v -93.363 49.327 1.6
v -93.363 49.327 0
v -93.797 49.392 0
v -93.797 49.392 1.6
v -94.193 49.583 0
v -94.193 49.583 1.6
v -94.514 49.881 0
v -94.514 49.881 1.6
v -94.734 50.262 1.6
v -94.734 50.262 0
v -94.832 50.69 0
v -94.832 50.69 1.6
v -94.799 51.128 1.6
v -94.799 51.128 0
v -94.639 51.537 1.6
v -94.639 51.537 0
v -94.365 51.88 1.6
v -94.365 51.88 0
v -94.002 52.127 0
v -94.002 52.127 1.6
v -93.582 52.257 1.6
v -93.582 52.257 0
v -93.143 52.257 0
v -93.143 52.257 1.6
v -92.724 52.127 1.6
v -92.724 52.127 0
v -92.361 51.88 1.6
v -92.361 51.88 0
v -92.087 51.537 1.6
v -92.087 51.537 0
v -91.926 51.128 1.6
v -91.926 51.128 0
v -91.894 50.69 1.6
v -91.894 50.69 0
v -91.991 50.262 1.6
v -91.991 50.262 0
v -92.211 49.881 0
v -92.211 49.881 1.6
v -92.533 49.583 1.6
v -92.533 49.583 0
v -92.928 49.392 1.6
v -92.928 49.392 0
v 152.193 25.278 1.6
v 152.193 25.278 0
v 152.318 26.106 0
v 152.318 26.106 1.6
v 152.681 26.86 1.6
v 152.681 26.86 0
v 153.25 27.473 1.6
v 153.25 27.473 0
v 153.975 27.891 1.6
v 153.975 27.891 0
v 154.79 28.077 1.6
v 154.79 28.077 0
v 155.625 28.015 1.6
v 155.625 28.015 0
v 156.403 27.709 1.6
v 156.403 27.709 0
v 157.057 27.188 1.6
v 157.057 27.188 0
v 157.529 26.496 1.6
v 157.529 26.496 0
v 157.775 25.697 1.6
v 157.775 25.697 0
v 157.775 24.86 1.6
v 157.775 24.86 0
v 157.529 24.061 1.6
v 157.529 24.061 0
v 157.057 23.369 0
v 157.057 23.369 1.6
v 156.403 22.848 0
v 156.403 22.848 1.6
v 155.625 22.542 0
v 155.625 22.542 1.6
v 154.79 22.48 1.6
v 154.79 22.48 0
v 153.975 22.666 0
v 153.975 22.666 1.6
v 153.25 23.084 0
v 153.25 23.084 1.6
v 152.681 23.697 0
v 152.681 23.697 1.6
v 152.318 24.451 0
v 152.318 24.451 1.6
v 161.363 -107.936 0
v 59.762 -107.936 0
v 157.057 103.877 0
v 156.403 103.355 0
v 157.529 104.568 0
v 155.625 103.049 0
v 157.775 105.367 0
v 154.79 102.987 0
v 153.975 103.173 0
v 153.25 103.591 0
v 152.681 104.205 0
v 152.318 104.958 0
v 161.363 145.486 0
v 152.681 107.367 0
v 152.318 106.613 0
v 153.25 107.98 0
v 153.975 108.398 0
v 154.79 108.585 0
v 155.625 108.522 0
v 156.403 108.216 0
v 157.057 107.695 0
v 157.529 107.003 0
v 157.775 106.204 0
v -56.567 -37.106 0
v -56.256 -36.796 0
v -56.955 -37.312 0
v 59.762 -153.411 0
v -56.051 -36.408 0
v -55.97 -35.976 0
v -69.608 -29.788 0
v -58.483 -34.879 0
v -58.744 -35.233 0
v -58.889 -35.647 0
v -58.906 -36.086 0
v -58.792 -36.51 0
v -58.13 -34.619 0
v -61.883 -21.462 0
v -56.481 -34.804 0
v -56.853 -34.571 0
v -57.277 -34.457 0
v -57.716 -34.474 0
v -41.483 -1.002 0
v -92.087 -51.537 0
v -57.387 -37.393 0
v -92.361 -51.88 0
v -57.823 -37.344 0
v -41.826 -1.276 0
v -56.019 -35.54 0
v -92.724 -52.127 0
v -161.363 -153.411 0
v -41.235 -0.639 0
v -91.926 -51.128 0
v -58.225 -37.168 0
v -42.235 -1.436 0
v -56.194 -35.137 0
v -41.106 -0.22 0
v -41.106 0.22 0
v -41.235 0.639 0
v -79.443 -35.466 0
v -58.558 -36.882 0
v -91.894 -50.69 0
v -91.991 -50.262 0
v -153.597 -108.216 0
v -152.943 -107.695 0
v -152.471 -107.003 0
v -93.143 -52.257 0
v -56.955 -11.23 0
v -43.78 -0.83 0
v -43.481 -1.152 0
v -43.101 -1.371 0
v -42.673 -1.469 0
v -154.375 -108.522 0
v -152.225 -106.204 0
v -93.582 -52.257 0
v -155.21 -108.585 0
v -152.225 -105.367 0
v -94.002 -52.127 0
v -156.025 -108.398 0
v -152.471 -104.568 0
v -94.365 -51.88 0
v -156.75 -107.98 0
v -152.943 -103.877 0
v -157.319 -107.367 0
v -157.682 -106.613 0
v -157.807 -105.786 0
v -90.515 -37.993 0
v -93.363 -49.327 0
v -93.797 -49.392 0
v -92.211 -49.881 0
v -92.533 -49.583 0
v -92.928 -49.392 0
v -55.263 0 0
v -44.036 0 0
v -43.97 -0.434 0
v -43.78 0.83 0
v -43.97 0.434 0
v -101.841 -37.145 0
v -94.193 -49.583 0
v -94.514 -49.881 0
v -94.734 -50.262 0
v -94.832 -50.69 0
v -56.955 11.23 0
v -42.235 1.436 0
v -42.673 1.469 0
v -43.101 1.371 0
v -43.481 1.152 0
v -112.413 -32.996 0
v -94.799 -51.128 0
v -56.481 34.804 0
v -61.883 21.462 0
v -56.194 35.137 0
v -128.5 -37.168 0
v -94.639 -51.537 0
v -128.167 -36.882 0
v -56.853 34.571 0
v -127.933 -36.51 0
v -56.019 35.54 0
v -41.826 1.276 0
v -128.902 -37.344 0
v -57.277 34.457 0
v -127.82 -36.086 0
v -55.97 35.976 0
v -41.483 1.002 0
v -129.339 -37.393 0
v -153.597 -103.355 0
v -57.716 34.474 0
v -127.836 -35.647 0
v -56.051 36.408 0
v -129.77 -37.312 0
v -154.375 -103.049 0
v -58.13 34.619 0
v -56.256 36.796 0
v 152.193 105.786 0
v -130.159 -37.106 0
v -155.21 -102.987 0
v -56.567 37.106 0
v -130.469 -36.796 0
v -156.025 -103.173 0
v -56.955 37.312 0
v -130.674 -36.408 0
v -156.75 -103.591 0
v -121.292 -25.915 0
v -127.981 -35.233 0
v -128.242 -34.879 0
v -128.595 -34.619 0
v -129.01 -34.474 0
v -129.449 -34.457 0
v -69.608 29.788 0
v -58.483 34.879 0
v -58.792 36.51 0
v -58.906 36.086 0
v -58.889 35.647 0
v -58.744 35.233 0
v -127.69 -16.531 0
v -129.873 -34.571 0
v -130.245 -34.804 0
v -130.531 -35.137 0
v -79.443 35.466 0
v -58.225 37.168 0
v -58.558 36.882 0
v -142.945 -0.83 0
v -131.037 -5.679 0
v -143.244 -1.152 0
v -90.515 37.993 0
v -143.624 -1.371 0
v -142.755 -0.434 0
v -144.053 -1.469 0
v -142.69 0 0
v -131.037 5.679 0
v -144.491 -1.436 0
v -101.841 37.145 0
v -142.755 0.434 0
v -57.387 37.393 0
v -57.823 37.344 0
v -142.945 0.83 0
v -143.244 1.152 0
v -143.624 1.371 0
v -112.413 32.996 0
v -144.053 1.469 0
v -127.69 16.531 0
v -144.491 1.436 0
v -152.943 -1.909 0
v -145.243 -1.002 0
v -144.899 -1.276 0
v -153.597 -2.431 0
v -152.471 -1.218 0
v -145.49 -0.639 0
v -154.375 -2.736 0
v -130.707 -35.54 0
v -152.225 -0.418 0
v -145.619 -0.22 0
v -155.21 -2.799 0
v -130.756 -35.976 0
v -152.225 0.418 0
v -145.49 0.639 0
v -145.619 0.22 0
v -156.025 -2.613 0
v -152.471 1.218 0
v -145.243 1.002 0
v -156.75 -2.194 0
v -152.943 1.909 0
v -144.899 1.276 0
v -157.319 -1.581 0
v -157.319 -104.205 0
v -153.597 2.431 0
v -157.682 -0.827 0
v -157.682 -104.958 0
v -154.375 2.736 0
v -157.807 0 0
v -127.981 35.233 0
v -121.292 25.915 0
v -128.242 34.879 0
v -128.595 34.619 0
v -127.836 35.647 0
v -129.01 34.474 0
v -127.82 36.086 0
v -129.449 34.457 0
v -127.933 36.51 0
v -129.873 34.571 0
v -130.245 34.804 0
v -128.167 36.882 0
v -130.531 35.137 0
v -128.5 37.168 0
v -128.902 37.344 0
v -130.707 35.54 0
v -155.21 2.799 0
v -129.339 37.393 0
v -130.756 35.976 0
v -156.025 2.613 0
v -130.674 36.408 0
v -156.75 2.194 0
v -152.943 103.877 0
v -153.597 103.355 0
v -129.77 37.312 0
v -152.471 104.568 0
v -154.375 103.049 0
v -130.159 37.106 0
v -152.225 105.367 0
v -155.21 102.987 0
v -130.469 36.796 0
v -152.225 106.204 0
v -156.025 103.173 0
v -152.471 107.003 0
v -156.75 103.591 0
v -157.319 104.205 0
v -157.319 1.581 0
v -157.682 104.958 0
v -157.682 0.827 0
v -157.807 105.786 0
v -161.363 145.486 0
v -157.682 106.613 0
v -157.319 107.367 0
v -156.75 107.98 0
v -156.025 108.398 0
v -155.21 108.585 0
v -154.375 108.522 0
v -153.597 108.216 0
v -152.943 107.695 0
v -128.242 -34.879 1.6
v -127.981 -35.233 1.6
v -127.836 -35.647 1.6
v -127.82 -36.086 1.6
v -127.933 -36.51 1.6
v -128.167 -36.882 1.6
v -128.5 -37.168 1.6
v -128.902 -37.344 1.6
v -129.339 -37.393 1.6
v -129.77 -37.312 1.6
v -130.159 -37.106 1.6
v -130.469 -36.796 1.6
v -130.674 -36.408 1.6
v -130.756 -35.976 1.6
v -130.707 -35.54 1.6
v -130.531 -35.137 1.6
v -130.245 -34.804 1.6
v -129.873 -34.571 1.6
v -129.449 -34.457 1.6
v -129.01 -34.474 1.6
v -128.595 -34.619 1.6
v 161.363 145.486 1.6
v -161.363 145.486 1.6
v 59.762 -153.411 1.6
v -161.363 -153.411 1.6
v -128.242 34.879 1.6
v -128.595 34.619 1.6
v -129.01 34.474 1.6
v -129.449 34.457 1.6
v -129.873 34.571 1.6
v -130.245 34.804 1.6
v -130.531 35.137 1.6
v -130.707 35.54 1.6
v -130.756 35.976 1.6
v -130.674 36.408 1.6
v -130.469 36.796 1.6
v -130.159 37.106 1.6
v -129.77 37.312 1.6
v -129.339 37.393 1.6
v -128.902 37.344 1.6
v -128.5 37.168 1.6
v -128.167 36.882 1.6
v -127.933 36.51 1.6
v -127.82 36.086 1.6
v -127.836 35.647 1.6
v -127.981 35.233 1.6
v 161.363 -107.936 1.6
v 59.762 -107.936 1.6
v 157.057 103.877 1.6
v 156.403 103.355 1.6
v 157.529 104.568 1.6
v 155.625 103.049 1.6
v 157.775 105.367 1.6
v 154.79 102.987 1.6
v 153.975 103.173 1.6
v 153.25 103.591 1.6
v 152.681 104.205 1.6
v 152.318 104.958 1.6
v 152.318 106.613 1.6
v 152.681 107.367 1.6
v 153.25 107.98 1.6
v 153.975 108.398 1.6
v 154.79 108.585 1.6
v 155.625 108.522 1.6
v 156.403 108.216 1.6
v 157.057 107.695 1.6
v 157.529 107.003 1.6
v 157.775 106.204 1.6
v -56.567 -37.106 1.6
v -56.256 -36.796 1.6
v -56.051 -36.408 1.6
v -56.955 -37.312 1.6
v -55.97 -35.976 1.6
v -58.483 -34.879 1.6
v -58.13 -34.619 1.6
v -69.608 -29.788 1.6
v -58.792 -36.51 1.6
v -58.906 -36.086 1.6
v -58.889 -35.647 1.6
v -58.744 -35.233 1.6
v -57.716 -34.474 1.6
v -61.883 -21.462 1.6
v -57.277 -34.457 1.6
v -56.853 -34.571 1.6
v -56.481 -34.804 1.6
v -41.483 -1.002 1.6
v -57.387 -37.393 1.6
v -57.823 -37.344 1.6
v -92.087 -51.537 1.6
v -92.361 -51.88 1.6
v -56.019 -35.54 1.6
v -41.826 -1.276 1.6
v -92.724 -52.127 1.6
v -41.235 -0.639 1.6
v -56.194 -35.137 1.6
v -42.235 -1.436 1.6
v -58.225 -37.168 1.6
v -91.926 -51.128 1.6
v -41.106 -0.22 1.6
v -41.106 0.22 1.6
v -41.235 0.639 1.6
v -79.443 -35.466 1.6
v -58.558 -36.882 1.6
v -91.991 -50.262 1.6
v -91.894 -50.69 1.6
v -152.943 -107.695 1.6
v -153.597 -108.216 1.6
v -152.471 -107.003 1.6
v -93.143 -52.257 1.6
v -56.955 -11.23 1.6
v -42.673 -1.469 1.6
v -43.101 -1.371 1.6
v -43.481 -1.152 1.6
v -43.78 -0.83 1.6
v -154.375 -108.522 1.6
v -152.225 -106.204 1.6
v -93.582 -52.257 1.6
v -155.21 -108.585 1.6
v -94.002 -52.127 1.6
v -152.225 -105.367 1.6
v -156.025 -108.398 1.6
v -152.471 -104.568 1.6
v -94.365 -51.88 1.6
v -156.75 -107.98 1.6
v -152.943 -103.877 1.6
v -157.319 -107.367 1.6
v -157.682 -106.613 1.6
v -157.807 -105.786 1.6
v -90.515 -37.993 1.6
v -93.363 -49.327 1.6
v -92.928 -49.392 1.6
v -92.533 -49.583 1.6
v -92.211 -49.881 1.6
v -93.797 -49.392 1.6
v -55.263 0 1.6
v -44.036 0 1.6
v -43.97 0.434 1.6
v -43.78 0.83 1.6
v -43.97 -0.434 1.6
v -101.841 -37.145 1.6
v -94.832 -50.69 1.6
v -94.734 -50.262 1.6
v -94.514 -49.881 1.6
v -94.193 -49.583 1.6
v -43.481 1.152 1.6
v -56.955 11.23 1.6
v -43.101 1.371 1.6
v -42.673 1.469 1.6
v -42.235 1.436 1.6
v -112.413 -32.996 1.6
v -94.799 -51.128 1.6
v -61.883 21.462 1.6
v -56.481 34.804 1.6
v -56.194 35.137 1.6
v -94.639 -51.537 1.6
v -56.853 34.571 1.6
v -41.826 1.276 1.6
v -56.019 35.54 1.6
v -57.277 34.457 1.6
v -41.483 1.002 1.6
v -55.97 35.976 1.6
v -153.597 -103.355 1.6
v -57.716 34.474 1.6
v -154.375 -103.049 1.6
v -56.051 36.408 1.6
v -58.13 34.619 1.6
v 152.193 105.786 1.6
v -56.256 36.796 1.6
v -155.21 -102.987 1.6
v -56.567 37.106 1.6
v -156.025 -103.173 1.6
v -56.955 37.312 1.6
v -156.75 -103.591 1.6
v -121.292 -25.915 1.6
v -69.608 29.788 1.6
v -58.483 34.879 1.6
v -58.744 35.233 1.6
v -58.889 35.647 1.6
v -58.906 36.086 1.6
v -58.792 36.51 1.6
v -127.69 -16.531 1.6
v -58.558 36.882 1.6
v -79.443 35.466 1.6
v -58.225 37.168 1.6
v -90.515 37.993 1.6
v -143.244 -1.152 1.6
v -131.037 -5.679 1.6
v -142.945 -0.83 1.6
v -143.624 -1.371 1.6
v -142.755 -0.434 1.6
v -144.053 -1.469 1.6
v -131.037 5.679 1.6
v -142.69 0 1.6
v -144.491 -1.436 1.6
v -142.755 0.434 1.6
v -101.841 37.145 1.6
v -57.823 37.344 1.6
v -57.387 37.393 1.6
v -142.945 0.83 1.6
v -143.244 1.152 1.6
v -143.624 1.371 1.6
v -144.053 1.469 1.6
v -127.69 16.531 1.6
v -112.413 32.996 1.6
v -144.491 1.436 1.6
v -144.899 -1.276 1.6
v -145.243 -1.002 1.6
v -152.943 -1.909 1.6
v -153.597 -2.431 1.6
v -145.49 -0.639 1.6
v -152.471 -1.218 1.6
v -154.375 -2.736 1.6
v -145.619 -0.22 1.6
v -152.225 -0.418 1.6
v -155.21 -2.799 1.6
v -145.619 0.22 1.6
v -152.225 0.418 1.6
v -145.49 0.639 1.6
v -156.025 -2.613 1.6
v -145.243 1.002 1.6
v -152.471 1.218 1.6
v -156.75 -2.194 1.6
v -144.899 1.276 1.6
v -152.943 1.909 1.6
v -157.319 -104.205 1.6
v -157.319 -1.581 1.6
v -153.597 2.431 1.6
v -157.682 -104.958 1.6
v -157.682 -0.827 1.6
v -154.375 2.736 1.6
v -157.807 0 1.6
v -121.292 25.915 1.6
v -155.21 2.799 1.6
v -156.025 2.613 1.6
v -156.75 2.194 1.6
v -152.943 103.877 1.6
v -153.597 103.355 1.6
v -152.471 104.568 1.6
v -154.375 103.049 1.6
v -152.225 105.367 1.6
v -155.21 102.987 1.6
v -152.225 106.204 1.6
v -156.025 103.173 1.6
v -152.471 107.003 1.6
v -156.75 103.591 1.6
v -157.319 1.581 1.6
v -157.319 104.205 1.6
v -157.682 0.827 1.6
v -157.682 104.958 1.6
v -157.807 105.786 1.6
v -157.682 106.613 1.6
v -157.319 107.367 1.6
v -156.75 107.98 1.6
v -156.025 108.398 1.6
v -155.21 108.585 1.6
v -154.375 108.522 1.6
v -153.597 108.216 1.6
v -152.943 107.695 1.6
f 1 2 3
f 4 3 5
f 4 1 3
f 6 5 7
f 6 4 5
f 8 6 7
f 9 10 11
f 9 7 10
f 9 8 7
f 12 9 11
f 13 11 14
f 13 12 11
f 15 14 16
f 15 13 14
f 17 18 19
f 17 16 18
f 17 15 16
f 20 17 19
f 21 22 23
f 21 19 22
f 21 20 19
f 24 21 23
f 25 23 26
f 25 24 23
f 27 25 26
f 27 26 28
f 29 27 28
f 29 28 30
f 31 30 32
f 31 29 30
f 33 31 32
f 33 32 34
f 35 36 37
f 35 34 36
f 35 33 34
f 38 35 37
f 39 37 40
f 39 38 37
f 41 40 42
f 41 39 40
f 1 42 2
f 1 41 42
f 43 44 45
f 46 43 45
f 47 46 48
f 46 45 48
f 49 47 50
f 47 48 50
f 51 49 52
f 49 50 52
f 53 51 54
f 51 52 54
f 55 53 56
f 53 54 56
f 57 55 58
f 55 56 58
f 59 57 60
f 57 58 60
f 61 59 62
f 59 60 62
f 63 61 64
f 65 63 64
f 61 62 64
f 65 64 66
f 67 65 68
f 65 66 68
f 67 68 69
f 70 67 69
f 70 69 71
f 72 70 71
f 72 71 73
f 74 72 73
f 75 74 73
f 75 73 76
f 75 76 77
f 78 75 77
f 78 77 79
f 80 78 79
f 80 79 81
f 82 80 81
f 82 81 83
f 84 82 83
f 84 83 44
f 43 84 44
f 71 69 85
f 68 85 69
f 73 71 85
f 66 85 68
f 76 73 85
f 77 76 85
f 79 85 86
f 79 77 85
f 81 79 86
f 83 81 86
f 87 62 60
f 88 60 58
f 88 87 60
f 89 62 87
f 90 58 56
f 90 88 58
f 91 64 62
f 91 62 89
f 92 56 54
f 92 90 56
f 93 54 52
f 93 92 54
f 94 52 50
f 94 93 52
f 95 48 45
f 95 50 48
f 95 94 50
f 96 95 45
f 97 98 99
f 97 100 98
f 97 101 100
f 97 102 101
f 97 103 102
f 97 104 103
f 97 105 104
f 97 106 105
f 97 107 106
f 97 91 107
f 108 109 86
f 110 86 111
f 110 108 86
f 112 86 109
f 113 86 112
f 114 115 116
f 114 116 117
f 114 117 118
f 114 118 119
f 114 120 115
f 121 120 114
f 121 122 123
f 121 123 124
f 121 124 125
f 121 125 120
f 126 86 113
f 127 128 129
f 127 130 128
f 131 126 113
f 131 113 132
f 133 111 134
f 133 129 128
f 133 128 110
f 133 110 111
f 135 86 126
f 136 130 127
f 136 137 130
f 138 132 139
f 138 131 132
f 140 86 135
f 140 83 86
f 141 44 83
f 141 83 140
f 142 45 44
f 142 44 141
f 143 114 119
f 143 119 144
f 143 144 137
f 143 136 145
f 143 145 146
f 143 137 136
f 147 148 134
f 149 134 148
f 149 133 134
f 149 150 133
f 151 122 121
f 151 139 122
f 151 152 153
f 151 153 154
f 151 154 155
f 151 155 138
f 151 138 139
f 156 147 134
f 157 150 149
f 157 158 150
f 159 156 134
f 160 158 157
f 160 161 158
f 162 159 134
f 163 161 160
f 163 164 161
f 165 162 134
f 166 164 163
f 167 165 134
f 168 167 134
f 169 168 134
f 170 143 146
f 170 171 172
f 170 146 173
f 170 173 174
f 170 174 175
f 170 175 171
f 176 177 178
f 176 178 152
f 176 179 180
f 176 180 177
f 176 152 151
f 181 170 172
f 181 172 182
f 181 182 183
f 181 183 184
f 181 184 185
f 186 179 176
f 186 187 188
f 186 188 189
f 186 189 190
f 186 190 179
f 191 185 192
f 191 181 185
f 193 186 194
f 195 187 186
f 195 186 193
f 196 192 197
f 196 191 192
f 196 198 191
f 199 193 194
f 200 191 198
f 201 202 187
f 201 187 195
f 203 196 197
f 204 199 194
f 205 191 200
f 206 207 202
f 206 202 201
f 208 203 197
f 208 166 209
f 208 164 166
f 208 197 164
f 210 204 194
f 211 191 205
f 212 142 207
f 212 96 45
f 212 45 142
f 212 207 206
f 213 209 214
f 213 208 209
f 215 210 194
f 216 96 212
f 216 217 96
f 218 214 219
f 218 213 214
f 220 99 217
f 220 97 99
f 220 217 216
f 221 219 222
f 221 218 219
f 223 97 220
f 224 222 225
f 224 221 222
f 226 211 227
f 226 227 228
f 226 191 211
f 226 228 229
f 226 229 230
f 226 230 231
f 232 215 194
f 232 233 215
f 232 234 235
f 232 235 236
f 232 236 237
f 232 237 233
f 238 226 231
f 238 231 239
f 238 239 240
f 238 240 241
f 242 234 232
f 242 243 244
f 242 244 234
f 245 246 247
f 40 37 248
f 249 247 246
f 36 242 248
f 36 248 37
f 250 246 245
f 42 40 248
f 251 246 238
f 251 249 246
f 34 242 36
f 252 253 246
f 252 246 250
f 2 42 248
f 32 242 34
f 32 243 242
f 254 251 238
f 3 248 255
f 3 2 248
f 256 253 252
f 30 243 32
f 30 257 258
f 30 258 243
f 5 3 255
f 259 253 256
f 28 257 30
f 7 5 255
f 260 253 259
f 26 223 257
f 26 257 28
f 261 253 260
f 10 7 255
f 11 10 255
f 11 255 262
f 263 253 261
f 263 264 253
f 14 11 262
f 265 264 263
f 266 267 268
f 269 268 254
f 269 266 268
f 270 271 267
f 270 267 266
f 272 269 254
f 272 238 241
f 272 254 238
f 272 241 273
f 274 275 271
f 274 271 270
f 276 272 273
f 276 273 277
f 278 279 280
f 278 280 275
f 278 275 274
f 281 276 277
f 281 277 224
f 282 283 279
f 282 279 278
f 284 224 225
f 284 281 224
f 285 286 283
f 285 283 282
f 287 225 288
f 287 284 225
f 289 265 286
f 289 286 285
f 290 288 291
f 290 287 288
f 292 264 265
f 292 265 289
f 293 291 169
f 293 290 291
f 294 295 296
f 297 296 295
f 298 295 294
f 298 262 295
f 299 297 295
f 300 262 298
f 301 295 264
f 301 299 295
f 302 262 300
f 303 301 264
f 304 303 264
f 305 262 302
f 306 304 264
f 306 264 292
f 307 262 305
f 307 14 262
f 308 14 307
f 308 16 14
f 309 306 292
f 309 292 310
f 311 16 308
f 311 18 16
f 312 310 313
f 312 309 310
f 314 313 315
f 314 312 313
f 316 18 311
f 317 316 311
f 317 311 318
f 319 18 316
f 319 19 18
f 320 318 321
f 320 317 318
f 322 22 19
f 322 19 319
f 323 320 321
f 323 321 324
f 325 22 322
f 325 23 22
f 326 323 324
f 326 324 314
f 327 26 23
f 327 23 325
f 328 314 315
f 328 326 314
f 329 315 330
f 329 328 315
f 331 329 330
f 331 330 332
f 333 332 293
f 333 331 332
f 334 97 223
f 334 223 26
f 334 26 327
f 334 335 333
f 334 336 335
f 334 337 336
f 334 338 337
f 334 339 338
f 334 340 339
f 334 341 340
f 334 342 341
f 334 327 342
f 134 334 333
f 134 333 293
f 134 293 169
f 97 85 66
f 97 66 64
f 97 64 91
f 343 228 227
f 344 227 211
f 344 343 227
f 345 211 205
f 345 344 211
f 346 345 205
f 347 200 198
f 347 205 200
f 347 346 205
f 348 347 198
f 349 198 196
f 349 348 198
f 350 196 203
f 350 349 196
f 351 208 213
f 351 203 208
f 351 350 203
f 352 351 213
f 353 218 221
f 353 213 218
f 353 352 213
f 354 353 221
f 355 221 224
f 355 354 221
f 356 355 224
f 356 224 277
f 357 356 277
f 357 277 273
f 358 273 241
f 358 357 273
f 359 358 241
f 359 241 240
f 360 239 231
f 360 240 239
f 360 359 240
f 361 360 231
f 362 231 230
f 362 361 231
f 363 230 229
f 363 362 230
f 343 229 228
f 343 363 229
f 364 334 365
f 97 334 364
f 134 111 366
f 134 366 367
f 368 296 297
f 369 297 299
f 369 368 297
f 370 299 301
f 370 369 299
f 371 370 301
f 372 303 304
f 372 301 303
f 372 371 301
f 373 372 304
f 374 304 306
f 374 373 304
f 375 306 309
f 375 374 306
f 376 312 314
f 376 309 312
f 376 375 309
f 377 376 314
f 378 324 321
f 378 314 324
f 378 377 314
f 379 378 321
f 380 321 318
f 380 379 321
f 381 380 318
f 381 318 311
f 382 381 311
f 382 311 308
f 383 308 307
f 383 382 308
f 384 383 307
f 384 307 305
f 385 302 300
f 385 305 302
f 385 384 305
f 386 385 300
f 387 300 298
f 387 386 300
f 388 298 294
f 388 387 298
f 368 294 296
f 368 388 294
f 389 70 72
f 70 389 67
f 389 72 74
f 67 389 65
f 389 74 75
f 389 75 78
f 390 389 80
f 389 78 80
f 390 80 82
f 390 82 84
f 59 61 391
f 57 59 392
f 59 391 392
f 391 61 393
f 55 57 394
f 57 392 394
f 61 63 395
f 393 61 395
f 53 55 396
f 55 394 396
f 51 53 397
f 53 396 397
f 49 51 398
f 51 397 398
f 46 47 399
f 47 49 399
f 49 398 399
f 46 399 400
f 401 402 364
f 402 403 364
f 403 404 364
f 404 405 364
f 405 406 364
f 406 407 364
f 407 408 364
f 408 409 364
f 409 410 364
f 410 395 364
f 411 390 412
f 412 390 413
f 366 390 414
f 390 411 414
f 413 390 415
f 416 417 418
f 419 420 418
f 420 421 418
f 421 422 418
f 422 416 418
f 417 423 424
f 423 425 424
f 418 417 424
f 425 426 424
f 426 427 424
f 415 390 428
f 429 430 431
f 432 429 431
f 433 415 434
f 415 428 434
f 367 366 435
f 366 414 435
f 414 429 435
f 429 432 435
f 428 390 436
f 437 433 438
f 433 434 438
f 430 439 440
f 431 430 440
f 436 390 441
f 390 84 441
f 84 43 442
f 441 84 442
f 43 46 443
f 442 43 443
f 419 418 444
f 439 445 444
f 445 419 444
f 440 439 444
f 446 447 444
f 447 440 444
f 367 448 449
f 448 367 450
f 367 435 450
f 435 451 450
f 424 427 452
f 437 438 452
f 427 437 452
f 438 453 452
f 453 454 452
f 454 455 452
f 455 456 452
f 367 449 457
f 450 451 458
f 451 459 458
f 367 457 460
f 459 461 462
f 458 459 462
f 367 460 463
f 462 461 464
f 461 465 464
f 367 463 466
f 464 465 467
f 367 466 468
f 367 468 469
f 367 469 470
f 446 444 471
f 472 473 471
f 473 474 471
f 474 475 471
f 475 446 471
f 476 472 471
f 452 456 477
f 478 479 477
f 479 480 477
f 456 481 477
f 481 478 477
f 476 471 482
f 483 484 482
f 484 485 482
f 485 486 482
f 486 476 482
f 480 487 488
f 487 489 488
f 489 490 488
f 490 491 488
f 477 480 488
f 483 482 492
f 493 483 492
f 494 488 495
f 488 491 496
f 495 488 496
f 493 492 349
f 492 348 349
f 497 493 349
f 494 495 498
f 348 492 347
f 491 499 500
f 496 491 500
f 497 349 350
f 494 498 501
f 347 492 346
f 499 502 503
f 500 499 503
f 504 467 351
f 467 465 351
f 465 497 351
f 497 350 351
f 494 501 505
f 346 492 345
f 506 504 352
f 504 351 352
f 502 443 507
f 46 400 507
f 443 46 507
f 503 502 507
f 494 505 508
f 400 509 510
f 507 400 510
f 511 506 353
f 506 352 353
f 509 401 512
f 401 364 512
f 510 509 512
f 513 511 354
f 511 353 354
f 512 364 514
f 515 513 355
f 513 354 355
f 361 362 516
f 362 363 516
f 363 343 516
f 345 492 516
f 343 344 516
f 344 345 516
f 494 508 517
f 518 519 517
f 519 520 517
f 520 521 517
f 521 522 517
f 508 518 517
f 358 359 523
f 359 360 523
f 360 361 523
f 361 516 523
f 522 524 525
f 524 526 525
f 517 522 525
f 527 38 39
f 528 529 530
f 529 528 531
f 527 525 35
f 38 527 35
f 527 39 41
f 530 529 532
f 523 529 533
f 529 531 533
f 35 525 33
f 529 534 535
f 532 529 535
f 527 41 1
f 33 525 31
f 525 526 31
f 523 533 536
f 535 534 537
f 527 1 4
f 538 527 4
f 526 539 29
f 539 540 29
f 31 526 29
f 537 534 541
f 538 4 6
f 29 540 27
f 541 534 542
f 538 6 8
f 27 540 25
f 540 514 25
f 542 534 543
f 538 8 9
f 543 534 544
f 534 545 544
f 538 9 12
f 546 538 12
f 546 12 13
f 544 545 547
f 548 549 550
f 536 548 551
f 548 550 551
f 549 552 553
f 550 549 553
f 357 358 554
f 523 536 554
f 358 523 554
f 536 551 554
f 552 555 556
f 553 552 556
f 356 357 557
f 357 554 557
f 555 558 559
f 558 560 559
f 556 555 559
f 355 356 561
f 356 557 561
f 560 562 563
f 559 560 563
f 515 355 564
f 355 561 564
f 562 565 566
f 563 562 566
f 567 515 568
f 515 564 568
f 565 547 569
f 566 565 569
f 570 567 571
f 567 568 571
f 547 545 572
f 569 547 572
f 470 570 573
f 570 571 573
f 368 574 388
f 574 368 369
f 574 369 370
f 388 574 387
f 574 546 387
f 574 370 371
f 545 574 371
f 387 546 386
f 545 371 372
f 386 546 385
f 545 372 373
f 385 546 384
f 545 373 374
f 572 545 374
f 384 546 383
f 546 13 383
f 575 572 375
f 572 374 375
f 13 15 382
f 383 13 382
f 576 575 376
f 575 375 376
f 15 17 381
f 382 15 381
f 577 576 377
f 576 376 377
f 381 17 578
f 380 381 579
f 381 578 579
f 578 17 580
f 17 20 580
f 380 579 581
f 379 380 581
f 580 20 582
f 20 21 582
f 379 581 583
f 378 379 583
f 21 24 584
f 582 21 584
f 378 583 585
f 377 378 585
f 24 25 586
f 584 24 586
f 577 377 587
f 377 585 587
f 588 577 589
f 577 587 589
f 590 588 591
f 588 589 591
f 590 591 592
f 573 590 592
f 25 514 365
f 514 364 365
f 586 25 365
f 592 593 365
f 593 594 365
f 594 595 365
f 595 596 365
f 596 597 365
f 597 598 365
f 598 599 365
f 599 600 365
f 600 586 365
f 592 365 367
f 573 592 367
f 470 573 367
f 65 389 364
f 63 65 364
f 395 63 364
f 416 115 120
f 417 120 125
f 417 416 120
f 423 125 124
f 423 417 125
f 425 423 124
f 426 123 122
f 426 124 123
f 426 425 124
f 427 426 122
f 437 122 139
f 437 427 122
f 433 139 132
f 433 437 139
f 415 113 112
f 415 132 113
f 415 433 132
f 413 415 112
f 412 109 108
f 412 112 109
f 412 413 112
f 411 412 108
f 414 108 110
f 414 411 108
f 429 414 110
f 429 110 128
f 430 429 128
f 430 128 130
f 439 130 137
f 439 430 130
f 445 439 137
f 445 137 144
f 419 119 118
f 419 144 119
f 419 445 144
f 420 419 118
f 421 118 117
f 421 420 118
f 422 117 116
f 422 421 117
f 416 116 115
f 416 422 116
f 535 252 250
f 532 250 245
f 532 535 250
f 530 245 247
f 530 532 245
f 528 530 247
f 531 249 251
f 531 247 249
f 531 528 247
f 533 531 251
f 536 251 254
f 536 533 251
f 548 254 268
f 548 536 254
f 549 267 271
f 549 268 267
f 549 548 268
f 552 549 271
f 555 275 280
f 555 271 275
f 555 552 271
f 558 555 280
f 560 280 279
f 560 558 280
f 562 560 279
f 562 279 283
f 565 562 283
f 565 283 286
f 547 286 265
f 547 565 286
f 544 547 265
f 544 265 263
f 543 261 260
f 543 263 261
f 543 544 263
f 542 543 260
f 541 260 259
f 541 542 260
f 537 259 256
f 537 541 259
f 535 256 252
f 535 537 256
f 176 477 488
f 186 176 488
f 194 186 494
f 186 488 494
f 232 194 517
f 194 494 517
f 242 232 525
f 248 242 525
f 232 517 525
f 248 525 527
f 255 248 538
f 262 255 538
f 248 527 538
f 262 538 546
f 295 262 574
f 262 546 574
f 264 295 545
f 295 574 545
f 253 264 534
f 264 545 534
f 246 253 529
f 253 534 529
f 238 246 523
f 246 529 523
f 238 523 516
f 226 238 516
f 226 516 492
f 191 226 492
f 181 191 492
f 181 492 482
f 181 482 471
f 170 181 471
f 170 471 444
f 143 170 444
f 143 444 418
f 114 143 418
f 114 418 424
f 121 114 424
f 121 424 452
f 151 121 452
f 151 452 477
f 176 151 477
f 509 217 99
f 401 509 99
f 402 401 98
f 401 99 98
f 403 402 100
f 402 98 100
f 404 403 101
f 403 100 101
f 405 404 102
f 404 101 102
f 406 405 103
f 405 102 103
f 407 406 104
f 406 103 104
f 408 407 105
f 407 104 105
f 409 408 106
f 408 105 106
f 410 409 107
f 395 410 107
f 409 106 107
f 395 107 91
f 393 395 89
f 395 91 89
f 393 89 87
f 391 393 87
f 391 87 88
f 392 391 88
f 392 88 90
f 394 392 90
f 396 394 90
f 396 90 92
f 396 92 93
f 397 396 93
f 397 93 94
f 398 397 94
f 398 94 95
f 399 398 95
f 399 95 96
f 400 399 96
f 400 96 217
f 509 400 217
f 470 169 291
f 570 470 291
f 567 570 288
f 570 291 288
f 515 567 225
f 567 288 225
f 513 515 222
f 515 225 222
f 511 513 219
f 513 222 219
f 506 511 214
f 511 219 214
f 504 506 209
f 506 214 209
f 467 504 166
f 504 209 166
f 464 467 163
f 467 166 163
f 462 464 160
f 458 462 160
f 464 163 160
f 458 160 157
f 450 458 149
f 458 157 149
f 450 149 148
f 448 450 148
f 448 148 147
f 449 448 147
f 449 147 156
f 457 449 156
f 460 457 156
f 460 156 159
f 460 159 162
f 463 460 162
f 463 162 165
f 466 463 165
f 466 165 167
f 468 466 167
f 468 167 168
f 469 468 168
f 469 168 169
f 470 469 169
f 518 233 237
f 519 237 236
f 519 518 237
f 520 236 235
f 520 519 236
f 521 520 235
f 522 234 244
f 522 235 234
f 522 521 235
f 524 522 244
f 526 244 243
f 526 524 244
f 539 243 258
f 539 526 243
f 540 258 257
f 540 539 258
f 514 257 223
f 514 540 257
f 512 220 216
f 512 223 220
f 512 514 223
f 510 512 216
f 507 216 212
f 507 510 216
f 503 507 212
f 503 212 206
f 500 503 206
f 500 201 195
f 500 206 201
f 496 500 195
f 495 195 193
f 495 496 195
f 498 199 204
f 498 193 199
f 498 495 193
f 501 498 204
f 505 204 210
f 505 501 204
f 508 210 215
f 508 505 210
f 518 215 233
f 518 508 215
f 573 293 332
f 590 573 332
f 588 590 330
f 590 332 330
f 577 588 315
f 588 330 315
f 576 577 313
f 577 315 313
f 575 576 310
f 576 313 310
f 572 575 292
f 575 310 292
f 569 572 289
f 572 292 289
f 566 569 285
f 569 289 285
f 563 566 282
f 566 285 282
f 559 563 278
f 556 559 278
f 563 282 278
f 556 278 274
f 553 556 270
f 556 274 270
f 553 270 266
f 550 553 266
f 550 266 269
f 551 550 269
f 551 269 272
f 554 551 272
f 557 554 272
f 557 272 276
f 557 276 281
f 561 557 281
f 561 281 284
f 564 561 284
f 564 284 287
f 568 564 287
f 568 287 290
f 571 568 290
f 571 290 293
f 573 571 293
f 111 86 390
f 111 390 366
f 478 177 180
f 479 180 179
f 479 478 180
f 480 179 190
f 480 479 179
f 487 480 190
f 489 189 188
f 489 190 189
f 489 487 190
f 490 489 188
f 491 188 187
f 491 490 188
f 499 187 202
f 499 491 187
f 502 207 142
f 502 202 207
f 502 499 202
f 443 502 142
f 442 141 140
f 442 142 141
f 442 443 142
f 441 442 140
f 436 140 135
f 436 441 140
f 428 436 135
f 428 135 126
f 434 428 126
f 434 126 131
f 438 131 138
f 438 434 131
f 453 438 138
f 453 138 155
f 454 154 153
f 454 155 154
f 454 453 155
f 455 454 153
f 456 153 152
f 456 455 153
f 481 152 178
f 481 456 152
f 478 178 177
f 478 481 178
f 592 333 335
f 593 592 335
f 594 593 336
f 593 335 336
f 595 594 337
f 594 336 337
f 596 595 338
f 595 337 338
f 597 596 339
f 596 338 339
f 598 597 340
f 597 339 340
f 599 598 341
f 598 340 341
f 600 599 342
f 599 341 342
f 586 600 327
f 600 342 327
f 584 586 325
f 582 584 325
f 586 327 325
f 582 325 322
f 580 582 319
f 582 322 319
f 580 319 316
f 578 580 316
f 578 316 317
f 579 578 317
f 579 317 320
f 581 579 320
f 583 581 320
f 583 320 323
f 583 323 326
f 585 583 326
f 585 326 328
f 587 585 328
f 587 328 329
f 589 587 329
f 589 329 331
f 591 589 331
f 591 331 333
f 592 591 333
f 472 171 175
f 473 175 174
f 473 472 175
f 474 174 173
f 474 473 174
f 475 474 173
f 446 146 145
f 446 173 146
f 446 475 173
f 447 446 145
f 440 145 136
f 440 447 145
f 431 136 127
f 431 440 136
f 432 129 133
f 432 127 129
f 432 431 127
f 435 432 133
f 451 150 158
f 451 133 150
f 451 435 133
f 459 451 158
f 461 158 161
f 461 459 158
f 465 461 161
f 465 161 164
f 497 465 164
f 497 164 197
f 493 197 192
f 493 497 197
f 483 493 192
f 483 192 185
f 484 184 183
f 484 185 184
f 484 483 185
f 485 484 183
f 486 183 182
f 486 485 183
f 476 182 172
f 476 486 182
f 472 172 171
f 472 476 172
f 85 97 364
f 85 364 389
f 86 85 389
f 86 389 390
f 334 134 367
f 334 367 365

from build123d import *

# Parameters (mm, degrees)
BOSS_EXTRUDE1_DEPTH        = 1.6002
SKETCH2_R                  = 38.1
CUT_EXTRUDE1_DEPTH         = 2.6002
CIRPATTERN1_COUNT          = 8
F_10_CLEARANCE_HOLE1_D     = 5.6134
F_10_CLEARANCE_HOLE1_DEPTH = 9.53
F_10_CLEARANCE_HOLE1_TIP   = 1.686435499


with BuildPart() as part:
    # Sketch1 → Boss-Extrude1 (new body)
    with BuildSketch(Plane.XY):
        Polygon((161.3627, -107.93570835), (59.7625, -107.93570835), (59.7625, -153.41070835), (-161.3627, -153.41070835), (-161.3627, 145.48590835), (161.3627, 145.48590835), align=None)
    extrude(amount=BOSS_EXTRUDE1_DEPTH)

    # Sketch2 → Cut-Extrude1 (cut, through all)
    with BuildSketch(Plane.XY.offset(1.6002)):
        with Locations((-93.3627, 0)):
            Circle(SKETCH2_R)
    extrude(amount=-CUT_EXTRUDE1_DEPTH, mode=Mode.SUBTRACT)

    # Sketch11 → #4 Clearance Hole1 (revolve, cut)
    with BuildSketch(Plane(origin=(-93.3627, 50.8, 1.6002), x_dir=(0, -1, 0), z_dir=(1, 0, 0))):
        Polygon((0, 0), (0, 173.855187864), (1.4732, 172.97), (1.4732, 0), align=None)
    f_4_clearance_hole1 = revolve(axis=Axis((-93.3627, 50.8, 7.9502), (0, 0, -1)), mode=Mode.SUBTRACT)

    # CirPattern1: #4 Clearance Hole1 ×8 about axis
    cirpattern1_axis = Axis((-93.3627, 0, 0), (0, 0, 1))
    for i in range(1, CIRPATTERN1_COUNT):
        add(f_4_clearance_hole1.rotate(cirpattern1_axis, i * 360 / CIRPATTERN1_COUNT), mode=Mode.SUBTRACT)

    # #10 Clearance Hole1
    with Locations(Plane.XY.offset(1.6002)):
        with Locations((-155, 105.78570835), (-155, 0), (-155, -105.78570835), (155, 105.78570835), (155, 25.27849165)):
            Hole(F_10_CLEARANCE_HOLE1_D / 2, depth=F_10_CLEARANCE_HOLE1_DEPTH)
            with Locations((0, 0, -(F_10_CLEARANCE_HOLE1_DEPTH + F_10_CLEARANCE_HOLE1_TIP / 2))):  # 118° drill point
                Cone(0, F_10_CLEARANCE_HOLE1_D / 2, F_10_CLEARANCE_HOLE1_TIP, mode=Mode.SUBTRACT)


solid = part.part
